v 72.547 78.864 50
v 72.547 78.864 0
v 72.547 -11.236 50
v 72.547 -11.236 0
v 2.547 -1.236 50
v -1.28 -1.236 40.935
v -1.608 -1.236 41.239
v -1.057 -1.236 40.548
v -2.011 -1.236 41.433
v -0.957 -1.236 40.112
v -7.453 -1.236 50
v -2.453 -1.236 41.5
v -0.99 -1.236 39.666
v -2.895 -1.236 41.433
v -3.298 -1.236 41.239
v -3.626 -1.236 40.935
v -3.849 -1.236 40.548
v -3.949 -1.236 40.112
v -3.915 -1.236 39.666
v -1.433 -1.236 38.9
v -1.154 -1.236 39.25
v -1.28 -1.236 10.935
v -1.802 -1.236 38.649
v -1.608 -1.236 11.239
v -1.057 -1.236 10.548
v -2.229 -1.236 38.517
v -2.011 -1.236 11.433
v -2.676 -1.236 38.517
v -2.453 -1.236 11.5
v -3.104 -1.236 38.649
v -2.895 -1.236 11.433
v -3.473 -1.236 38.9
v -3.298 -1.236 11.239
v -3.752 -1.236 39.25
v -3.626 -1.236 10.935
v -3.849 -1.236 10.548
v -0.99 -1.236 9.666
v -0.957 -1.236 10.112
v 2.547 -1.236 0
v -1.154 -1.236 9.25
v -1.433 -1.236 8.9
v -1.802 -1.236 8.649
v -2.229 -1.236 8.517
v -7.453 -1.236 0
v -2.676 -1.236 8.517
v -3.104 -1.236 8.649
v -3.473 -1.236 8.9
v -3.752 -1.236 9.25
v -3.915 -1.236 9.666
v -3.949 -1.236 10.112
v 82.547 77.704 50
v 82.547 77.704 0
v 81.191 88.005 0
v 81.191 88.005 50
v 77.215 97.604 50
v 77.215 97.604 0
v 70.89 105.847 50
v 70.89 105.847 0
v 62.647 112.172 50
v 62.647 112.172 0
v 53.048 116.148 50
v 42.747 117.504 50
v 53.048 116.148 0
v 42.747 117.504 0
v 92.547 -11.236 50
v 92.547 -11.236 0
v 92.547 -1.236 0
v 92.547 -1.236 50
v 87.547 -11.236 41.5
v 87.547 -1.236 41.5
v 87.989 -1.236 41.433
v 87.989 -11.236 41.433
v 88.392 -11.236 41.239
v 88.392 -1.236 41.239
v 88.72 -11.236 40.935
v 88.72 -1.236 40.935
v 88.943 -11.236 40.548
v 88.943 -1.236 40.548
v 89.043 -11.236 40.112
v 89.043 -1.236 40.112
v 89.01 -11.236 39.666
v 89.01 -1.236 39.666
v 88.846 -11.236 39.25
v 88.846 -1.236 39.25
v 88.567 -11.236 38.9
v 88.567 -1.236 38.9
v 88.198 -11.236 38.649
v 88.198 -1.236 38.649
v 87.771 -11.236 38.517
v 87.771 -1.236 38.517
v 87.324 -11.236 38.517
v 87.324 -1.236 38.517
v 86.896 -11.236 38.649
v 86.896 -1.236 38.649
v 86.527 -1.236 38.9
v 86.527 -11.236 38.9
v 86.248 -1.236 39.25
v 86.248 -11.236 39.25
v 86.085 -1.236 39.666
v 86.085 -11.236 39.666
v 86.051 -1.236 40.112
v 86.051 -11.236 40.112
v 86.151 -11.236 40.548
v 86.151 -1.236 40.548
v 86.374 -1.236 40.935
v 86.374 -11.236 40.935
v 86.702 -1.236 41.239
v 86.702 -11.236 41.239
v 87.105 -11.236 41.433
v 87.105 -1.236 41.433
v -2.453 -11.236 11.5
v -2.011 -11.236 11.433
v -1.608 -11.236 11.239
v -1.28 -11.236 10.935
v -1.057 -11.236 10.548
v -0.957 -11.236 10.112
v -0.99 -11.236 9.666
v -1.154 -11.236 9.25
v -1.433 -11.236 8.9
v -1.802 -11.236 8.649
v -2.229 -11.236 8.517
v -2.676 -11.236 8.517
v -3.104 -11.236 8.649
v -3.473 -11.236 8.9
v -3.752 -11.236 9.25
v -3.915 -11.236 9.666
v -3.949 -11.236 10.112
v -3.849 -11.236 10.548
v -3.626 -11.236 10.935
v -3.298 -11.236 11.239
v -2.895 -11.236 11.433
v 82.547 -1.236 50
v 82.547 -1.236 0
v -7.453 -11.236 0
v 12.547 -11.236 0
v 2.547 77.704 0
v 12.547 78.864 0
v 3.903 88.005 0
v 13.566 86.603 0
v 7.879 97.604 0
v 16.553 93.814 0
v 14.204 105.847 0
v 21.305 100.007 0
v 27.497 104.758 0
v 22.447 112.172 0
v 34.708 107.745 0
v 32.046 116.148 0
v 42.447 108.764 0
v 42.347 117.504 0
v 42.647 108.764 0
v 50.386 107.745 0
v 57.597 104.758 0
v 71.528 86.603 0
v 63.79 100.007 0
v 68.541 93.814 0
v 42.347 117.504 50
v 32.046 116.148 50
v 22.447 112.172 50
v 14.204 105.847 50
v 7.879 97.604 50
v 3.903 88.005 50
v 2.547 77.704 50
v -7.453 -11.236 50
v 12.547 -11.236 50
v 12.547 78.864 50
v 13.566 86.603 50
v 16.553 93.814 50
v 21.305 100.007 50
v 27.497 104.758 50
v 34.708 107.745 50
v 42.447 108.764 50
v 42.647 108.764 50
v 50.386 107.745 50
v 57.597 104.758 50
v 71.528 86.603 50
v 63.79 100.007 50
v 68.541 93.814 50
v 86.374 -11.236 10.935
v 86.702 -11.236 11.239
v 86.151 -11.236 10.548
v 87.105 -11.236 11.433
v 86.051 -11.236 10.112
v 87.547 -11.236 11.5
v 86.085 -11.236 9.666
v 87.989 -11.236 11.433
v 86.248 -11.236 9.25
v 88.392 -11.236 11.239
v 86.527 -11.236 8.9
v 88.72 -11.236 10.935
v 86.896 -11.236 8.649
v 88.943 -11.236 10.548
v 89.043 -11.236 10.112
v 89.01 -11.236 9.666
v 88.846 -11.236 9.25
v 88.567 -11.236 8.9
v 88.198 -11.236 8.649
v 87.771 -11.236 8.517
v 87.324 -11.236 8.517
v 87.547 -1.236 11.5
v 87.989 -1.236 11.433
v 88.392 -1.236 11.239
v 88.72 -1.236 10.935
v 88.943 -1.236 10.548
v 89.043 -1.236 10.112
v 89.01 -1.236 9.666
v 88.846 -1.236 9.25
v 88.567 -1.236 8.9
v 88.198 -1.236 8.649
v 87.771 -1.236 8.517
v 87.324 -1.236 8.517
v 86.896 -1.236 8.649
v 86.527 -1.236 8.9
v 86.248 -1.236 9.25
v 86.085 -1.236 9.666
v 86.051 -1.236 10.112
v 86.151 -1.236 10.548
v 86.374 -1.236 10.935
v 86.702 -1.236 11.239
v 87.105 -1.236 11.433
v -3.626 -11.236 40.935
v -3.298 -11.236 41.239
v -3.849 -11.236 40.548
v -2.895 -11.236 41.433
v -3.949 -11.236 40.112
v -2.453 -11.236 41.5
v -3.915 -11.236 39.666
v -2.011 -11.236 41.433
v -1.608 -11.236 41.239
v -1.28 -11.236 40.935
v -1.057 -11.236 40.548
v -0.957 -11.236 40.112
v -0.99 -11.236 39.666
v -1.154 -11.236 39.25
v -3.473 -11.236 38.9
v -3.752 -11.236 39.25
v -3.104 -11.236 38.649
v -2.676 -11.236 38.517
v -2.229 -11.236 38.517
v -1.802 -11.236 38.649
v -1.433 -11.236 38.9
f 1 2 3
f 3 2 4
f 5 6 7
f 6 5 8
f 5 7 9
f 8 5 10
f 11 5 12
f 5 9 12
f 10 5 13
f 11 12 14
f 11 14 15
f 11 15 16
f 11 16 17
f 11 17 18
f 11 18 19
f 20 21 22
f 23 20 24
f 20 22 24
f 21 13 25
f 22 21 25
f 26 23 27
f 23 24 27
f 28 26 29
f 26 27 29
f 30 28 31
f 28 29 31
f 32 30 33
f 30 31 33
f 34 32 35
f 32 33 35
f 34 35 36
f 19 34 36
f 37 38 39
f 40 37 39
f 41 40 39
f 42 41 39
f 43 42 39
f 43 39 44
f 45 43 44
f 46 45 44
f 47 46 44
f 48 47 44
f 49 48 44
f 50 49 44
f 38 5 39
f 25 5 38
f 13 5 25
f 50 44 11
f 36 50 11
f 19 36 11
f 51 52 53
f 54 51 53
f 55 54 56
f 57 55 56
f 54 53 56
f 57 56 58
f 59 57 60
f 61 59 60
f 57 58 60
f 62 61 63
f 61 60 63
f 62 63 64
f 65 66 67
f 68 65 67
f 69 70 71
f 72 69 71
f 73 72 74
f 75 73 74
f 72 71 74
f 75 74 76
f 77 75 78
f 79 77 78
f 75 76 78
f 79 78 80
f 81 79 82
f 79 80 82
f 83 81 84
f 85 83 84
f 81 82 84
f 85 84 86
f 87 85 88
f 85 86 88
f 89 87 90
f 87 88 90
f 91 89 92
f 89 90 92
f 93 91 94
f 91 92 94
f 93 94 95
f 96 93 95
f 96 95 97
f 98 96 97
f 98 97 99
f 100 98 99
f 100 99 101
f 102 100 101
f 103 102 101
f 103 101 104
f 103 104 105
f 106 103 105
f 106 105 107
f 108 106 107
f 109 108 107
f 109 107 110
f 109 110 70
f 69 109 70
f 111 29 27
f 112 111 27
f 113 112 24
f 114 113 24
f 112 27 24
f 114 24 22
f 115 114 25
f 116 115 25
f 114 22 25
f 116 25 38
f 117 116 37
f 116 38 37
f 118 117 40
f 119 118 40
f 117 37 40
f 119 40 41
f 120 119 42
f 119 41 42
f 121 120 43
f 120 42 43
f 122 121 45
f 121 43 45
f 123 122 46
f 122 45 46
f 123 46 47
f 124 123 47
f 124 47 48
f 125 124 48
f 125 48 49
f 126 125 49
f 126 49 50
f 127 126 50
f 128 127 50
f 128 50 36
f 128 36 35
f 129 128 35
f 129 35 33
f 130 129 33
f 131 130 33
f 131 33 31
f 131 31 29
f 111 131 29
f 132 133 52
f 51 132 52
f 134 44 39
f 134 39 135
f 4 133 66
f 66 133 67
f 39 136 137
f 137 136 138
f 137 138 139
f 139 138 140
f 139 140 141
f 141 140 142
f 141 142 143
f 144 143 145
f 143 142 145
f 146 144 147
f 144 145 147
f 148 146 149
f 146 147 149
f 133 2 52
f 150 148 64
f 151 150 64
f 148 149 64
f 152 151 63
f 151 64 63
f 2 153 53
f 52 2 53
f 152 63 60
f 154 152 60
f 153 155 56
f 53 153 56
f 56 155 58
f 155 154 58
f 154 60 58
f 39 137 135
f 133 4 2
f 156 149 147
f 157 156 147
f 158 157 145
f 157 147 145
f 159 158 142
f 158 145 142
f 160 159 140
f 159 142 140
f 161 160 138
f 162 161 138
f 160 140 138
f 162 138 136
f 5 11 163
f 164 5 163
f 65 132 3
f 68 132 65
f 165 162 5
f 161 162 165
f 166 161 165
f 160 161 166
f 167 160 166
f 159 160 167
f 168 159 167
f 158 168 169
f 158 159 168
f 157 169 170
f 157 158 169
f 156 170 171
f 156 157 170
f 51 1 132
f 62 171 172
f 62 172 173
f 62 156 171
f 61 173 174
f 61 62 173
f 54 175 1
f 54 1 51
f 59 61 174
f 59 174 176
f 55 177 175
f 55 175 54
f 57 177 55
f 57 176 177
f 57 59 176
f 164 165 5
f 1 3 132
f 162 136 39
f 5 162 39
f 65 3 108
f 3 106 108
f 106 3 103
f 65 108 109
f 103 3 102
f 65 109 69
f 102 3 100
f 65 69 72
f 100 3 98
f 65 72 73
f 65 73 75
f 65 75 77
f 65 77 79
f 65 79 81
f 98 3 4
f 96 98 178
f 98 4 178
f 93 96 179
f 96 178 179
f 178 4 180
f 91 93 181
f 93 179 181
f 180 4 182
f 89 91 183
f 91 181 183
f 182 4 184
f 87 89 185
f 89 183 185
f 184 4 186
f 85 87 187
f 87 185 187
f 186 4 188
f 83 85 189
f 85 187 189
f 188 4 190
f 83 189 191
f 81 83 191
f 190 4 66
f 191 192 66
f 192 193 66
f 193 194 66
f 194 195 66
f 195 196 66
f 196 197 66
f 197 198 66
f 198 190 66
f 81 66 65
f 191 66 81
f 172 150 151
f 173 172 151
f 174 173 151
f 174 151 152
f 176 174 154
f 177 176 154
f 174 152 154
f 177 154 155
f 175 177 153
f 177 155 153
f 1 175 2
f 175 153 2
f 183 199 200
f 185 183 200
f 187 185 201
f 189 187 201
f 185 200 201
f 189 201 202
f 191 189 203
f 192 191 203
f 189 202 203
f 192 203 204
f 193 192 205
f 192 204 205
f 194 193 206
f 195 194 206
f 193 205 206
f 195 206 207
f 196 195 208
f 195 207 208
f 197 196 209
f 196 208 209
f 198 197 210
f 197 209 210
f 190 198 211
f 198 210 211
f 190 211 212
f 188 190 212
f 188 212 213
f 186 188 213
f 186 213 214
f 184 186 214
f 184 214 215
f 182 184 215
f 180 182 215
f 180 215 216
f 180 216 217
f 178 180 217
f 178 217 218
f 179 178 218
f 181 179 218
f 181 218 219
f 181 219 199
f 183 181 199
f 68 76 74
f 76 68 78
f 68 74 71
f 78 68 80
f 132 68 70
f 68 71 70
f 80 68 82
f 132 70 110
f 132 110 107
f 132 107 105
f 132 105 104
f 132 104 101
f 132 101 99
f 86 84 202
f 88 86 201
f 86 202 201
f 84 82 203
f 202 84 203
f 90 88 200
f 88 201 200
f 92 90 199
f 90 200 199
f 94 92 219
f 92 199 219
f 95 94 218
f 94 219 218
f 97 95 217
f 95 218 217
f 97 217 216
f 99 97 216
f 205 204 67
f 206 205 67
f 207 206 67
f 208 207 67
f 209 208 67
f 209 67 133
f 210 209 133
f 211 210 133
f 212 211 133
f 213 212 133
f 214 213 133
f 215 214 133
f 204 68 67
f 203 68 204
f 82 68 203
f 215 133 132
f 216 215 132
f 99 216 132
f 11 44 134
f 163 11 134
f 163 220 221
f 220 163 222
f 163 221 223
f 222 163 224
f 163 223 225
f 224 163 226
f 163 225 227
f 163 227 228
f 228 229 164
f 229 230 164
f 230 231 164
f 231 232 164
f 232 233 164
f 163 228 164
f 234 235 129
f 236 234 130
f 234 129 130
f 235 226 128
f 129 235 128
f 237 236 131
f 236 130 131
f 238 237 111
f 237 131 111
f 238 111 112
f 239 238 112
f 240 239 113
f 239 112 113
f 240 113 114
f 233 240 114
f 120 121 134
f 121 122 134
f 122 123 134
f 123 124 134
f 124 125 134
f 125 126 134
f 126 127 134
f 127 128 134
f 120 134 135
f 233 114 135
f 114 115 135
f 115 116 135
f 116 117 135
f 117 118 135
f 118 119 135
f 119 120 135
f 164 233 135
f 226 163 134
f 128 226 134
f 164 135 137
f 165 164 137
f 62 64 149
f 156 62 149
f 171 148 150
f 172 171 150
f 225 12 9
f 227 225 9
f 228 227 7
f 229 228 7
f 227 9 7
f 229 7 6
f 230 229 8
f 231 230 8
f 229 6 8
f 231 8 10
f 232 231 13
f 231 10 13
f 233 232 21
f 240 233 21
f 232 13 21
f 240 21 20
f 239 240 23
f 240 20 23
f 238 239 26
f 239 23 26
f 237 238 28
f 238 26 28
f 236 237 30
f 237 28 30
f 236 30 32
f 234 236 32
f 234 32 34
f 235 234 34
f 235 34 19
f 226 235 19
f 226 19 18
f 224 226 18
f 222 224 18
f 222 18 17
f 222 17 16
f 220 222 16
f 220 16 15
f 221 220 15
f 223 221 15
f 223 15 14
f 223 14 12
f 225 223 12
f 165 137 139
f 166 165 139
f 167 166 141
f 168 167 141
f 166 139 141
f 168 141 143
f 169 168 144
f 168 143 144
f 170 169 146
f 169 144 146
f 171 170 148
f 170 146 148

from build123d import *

# Parameters (mm, degrees)
BOSS_EXTRUDE2_DEPTH = 50
SKETCH3_R           = 1.5
CUT_EXTRUDE1_DEPTH  = 50


with BuildPart() as part:
    # Sketch1 → Boss-Extrude2 (new body)
    with BuildSketch(Plane.XY):
        with BuildLine():
            Line((-7.452830189, -1.235849057), (-7.452830189, -11.235849057))
            Line((-7.452830189, -11.235849057), (12.547169811, -11.235849057))
            Line((12.547169811, -11.235849057), (12.547169811, 78.864150943))
            ThreePointArc((12.547169811, 78.864150943), (21.304677054, 100.006643701), (42.447169811, 108.764150943))
            Line((42.447169811, 108.764150943), (42.647169811, 108.764150943))
            ThreePointArc((42.647169811, 108.764150943), (63.789662569, 100.006643701), (72.547169811, 78.864150943))
            Line((72.547169811, 78.864150943), (72.547169811, -11.235849057))
            Line((72.547169811, -11.235849057), (92.547169811, -11.235849057))
            Line((92.547169811, -11.235849057), (92.547169811, -1.235849057))
            Line((92.547169811, -1.235849057), (82.547169811, -1.235849057))
            Line((82.547169811, -1.235849057), (82.547169811, 77.704131501))
            ThreePointArc((82.547169811, 77.704131501), (70.890019703, 105.846981392), (42.747169811, 117.504131501))
            Line((42.747169811, 117.504131501), (42.347169811, 117.504131501))
            ThreePointArc((42.347169811, 117.504131501), (14.20431992, 105.846981392), (2.547169811, 77.704131501))
            Line((2.547169811, 77.704131501), (2.547169811, -1.235849057))
            Line((2.547169811, -1.235849057), (-7.452830189, -1.235849057))
        make_face()
    extrude(amount=BOSS_EXTRUDE2_DEPTH)

    # Sketch3 → Cut-Extrude1 (cut)
    with BuildSketch(Plane(origin=(0, -1.235849057, 0), x_dir=(1, 0, 0), z_dir=(0, 1, 0))):
        with Locations(Location((-2.452830189, -40, 0), (0, 0, 270))):
            Circle(SKETCH3_R)
        with Locations(Location((-2.452830189, -10, 0), (0, 0, 270))):
            Circle(SKETCH3_R)
        with Locations(Location((87.547169811, -10, 0), (0, 0, 270))):
            Circle(SKETCH3_R)
        with Locations(Location((87.547169811, -40, 0), (0, 0, 270))):
            Circle(SKETCH3_R)
    extrude(amount=-CUT_EXTRUDE1_DEPTH, mode=Mode.SUBTRACT)


solid = part.part
